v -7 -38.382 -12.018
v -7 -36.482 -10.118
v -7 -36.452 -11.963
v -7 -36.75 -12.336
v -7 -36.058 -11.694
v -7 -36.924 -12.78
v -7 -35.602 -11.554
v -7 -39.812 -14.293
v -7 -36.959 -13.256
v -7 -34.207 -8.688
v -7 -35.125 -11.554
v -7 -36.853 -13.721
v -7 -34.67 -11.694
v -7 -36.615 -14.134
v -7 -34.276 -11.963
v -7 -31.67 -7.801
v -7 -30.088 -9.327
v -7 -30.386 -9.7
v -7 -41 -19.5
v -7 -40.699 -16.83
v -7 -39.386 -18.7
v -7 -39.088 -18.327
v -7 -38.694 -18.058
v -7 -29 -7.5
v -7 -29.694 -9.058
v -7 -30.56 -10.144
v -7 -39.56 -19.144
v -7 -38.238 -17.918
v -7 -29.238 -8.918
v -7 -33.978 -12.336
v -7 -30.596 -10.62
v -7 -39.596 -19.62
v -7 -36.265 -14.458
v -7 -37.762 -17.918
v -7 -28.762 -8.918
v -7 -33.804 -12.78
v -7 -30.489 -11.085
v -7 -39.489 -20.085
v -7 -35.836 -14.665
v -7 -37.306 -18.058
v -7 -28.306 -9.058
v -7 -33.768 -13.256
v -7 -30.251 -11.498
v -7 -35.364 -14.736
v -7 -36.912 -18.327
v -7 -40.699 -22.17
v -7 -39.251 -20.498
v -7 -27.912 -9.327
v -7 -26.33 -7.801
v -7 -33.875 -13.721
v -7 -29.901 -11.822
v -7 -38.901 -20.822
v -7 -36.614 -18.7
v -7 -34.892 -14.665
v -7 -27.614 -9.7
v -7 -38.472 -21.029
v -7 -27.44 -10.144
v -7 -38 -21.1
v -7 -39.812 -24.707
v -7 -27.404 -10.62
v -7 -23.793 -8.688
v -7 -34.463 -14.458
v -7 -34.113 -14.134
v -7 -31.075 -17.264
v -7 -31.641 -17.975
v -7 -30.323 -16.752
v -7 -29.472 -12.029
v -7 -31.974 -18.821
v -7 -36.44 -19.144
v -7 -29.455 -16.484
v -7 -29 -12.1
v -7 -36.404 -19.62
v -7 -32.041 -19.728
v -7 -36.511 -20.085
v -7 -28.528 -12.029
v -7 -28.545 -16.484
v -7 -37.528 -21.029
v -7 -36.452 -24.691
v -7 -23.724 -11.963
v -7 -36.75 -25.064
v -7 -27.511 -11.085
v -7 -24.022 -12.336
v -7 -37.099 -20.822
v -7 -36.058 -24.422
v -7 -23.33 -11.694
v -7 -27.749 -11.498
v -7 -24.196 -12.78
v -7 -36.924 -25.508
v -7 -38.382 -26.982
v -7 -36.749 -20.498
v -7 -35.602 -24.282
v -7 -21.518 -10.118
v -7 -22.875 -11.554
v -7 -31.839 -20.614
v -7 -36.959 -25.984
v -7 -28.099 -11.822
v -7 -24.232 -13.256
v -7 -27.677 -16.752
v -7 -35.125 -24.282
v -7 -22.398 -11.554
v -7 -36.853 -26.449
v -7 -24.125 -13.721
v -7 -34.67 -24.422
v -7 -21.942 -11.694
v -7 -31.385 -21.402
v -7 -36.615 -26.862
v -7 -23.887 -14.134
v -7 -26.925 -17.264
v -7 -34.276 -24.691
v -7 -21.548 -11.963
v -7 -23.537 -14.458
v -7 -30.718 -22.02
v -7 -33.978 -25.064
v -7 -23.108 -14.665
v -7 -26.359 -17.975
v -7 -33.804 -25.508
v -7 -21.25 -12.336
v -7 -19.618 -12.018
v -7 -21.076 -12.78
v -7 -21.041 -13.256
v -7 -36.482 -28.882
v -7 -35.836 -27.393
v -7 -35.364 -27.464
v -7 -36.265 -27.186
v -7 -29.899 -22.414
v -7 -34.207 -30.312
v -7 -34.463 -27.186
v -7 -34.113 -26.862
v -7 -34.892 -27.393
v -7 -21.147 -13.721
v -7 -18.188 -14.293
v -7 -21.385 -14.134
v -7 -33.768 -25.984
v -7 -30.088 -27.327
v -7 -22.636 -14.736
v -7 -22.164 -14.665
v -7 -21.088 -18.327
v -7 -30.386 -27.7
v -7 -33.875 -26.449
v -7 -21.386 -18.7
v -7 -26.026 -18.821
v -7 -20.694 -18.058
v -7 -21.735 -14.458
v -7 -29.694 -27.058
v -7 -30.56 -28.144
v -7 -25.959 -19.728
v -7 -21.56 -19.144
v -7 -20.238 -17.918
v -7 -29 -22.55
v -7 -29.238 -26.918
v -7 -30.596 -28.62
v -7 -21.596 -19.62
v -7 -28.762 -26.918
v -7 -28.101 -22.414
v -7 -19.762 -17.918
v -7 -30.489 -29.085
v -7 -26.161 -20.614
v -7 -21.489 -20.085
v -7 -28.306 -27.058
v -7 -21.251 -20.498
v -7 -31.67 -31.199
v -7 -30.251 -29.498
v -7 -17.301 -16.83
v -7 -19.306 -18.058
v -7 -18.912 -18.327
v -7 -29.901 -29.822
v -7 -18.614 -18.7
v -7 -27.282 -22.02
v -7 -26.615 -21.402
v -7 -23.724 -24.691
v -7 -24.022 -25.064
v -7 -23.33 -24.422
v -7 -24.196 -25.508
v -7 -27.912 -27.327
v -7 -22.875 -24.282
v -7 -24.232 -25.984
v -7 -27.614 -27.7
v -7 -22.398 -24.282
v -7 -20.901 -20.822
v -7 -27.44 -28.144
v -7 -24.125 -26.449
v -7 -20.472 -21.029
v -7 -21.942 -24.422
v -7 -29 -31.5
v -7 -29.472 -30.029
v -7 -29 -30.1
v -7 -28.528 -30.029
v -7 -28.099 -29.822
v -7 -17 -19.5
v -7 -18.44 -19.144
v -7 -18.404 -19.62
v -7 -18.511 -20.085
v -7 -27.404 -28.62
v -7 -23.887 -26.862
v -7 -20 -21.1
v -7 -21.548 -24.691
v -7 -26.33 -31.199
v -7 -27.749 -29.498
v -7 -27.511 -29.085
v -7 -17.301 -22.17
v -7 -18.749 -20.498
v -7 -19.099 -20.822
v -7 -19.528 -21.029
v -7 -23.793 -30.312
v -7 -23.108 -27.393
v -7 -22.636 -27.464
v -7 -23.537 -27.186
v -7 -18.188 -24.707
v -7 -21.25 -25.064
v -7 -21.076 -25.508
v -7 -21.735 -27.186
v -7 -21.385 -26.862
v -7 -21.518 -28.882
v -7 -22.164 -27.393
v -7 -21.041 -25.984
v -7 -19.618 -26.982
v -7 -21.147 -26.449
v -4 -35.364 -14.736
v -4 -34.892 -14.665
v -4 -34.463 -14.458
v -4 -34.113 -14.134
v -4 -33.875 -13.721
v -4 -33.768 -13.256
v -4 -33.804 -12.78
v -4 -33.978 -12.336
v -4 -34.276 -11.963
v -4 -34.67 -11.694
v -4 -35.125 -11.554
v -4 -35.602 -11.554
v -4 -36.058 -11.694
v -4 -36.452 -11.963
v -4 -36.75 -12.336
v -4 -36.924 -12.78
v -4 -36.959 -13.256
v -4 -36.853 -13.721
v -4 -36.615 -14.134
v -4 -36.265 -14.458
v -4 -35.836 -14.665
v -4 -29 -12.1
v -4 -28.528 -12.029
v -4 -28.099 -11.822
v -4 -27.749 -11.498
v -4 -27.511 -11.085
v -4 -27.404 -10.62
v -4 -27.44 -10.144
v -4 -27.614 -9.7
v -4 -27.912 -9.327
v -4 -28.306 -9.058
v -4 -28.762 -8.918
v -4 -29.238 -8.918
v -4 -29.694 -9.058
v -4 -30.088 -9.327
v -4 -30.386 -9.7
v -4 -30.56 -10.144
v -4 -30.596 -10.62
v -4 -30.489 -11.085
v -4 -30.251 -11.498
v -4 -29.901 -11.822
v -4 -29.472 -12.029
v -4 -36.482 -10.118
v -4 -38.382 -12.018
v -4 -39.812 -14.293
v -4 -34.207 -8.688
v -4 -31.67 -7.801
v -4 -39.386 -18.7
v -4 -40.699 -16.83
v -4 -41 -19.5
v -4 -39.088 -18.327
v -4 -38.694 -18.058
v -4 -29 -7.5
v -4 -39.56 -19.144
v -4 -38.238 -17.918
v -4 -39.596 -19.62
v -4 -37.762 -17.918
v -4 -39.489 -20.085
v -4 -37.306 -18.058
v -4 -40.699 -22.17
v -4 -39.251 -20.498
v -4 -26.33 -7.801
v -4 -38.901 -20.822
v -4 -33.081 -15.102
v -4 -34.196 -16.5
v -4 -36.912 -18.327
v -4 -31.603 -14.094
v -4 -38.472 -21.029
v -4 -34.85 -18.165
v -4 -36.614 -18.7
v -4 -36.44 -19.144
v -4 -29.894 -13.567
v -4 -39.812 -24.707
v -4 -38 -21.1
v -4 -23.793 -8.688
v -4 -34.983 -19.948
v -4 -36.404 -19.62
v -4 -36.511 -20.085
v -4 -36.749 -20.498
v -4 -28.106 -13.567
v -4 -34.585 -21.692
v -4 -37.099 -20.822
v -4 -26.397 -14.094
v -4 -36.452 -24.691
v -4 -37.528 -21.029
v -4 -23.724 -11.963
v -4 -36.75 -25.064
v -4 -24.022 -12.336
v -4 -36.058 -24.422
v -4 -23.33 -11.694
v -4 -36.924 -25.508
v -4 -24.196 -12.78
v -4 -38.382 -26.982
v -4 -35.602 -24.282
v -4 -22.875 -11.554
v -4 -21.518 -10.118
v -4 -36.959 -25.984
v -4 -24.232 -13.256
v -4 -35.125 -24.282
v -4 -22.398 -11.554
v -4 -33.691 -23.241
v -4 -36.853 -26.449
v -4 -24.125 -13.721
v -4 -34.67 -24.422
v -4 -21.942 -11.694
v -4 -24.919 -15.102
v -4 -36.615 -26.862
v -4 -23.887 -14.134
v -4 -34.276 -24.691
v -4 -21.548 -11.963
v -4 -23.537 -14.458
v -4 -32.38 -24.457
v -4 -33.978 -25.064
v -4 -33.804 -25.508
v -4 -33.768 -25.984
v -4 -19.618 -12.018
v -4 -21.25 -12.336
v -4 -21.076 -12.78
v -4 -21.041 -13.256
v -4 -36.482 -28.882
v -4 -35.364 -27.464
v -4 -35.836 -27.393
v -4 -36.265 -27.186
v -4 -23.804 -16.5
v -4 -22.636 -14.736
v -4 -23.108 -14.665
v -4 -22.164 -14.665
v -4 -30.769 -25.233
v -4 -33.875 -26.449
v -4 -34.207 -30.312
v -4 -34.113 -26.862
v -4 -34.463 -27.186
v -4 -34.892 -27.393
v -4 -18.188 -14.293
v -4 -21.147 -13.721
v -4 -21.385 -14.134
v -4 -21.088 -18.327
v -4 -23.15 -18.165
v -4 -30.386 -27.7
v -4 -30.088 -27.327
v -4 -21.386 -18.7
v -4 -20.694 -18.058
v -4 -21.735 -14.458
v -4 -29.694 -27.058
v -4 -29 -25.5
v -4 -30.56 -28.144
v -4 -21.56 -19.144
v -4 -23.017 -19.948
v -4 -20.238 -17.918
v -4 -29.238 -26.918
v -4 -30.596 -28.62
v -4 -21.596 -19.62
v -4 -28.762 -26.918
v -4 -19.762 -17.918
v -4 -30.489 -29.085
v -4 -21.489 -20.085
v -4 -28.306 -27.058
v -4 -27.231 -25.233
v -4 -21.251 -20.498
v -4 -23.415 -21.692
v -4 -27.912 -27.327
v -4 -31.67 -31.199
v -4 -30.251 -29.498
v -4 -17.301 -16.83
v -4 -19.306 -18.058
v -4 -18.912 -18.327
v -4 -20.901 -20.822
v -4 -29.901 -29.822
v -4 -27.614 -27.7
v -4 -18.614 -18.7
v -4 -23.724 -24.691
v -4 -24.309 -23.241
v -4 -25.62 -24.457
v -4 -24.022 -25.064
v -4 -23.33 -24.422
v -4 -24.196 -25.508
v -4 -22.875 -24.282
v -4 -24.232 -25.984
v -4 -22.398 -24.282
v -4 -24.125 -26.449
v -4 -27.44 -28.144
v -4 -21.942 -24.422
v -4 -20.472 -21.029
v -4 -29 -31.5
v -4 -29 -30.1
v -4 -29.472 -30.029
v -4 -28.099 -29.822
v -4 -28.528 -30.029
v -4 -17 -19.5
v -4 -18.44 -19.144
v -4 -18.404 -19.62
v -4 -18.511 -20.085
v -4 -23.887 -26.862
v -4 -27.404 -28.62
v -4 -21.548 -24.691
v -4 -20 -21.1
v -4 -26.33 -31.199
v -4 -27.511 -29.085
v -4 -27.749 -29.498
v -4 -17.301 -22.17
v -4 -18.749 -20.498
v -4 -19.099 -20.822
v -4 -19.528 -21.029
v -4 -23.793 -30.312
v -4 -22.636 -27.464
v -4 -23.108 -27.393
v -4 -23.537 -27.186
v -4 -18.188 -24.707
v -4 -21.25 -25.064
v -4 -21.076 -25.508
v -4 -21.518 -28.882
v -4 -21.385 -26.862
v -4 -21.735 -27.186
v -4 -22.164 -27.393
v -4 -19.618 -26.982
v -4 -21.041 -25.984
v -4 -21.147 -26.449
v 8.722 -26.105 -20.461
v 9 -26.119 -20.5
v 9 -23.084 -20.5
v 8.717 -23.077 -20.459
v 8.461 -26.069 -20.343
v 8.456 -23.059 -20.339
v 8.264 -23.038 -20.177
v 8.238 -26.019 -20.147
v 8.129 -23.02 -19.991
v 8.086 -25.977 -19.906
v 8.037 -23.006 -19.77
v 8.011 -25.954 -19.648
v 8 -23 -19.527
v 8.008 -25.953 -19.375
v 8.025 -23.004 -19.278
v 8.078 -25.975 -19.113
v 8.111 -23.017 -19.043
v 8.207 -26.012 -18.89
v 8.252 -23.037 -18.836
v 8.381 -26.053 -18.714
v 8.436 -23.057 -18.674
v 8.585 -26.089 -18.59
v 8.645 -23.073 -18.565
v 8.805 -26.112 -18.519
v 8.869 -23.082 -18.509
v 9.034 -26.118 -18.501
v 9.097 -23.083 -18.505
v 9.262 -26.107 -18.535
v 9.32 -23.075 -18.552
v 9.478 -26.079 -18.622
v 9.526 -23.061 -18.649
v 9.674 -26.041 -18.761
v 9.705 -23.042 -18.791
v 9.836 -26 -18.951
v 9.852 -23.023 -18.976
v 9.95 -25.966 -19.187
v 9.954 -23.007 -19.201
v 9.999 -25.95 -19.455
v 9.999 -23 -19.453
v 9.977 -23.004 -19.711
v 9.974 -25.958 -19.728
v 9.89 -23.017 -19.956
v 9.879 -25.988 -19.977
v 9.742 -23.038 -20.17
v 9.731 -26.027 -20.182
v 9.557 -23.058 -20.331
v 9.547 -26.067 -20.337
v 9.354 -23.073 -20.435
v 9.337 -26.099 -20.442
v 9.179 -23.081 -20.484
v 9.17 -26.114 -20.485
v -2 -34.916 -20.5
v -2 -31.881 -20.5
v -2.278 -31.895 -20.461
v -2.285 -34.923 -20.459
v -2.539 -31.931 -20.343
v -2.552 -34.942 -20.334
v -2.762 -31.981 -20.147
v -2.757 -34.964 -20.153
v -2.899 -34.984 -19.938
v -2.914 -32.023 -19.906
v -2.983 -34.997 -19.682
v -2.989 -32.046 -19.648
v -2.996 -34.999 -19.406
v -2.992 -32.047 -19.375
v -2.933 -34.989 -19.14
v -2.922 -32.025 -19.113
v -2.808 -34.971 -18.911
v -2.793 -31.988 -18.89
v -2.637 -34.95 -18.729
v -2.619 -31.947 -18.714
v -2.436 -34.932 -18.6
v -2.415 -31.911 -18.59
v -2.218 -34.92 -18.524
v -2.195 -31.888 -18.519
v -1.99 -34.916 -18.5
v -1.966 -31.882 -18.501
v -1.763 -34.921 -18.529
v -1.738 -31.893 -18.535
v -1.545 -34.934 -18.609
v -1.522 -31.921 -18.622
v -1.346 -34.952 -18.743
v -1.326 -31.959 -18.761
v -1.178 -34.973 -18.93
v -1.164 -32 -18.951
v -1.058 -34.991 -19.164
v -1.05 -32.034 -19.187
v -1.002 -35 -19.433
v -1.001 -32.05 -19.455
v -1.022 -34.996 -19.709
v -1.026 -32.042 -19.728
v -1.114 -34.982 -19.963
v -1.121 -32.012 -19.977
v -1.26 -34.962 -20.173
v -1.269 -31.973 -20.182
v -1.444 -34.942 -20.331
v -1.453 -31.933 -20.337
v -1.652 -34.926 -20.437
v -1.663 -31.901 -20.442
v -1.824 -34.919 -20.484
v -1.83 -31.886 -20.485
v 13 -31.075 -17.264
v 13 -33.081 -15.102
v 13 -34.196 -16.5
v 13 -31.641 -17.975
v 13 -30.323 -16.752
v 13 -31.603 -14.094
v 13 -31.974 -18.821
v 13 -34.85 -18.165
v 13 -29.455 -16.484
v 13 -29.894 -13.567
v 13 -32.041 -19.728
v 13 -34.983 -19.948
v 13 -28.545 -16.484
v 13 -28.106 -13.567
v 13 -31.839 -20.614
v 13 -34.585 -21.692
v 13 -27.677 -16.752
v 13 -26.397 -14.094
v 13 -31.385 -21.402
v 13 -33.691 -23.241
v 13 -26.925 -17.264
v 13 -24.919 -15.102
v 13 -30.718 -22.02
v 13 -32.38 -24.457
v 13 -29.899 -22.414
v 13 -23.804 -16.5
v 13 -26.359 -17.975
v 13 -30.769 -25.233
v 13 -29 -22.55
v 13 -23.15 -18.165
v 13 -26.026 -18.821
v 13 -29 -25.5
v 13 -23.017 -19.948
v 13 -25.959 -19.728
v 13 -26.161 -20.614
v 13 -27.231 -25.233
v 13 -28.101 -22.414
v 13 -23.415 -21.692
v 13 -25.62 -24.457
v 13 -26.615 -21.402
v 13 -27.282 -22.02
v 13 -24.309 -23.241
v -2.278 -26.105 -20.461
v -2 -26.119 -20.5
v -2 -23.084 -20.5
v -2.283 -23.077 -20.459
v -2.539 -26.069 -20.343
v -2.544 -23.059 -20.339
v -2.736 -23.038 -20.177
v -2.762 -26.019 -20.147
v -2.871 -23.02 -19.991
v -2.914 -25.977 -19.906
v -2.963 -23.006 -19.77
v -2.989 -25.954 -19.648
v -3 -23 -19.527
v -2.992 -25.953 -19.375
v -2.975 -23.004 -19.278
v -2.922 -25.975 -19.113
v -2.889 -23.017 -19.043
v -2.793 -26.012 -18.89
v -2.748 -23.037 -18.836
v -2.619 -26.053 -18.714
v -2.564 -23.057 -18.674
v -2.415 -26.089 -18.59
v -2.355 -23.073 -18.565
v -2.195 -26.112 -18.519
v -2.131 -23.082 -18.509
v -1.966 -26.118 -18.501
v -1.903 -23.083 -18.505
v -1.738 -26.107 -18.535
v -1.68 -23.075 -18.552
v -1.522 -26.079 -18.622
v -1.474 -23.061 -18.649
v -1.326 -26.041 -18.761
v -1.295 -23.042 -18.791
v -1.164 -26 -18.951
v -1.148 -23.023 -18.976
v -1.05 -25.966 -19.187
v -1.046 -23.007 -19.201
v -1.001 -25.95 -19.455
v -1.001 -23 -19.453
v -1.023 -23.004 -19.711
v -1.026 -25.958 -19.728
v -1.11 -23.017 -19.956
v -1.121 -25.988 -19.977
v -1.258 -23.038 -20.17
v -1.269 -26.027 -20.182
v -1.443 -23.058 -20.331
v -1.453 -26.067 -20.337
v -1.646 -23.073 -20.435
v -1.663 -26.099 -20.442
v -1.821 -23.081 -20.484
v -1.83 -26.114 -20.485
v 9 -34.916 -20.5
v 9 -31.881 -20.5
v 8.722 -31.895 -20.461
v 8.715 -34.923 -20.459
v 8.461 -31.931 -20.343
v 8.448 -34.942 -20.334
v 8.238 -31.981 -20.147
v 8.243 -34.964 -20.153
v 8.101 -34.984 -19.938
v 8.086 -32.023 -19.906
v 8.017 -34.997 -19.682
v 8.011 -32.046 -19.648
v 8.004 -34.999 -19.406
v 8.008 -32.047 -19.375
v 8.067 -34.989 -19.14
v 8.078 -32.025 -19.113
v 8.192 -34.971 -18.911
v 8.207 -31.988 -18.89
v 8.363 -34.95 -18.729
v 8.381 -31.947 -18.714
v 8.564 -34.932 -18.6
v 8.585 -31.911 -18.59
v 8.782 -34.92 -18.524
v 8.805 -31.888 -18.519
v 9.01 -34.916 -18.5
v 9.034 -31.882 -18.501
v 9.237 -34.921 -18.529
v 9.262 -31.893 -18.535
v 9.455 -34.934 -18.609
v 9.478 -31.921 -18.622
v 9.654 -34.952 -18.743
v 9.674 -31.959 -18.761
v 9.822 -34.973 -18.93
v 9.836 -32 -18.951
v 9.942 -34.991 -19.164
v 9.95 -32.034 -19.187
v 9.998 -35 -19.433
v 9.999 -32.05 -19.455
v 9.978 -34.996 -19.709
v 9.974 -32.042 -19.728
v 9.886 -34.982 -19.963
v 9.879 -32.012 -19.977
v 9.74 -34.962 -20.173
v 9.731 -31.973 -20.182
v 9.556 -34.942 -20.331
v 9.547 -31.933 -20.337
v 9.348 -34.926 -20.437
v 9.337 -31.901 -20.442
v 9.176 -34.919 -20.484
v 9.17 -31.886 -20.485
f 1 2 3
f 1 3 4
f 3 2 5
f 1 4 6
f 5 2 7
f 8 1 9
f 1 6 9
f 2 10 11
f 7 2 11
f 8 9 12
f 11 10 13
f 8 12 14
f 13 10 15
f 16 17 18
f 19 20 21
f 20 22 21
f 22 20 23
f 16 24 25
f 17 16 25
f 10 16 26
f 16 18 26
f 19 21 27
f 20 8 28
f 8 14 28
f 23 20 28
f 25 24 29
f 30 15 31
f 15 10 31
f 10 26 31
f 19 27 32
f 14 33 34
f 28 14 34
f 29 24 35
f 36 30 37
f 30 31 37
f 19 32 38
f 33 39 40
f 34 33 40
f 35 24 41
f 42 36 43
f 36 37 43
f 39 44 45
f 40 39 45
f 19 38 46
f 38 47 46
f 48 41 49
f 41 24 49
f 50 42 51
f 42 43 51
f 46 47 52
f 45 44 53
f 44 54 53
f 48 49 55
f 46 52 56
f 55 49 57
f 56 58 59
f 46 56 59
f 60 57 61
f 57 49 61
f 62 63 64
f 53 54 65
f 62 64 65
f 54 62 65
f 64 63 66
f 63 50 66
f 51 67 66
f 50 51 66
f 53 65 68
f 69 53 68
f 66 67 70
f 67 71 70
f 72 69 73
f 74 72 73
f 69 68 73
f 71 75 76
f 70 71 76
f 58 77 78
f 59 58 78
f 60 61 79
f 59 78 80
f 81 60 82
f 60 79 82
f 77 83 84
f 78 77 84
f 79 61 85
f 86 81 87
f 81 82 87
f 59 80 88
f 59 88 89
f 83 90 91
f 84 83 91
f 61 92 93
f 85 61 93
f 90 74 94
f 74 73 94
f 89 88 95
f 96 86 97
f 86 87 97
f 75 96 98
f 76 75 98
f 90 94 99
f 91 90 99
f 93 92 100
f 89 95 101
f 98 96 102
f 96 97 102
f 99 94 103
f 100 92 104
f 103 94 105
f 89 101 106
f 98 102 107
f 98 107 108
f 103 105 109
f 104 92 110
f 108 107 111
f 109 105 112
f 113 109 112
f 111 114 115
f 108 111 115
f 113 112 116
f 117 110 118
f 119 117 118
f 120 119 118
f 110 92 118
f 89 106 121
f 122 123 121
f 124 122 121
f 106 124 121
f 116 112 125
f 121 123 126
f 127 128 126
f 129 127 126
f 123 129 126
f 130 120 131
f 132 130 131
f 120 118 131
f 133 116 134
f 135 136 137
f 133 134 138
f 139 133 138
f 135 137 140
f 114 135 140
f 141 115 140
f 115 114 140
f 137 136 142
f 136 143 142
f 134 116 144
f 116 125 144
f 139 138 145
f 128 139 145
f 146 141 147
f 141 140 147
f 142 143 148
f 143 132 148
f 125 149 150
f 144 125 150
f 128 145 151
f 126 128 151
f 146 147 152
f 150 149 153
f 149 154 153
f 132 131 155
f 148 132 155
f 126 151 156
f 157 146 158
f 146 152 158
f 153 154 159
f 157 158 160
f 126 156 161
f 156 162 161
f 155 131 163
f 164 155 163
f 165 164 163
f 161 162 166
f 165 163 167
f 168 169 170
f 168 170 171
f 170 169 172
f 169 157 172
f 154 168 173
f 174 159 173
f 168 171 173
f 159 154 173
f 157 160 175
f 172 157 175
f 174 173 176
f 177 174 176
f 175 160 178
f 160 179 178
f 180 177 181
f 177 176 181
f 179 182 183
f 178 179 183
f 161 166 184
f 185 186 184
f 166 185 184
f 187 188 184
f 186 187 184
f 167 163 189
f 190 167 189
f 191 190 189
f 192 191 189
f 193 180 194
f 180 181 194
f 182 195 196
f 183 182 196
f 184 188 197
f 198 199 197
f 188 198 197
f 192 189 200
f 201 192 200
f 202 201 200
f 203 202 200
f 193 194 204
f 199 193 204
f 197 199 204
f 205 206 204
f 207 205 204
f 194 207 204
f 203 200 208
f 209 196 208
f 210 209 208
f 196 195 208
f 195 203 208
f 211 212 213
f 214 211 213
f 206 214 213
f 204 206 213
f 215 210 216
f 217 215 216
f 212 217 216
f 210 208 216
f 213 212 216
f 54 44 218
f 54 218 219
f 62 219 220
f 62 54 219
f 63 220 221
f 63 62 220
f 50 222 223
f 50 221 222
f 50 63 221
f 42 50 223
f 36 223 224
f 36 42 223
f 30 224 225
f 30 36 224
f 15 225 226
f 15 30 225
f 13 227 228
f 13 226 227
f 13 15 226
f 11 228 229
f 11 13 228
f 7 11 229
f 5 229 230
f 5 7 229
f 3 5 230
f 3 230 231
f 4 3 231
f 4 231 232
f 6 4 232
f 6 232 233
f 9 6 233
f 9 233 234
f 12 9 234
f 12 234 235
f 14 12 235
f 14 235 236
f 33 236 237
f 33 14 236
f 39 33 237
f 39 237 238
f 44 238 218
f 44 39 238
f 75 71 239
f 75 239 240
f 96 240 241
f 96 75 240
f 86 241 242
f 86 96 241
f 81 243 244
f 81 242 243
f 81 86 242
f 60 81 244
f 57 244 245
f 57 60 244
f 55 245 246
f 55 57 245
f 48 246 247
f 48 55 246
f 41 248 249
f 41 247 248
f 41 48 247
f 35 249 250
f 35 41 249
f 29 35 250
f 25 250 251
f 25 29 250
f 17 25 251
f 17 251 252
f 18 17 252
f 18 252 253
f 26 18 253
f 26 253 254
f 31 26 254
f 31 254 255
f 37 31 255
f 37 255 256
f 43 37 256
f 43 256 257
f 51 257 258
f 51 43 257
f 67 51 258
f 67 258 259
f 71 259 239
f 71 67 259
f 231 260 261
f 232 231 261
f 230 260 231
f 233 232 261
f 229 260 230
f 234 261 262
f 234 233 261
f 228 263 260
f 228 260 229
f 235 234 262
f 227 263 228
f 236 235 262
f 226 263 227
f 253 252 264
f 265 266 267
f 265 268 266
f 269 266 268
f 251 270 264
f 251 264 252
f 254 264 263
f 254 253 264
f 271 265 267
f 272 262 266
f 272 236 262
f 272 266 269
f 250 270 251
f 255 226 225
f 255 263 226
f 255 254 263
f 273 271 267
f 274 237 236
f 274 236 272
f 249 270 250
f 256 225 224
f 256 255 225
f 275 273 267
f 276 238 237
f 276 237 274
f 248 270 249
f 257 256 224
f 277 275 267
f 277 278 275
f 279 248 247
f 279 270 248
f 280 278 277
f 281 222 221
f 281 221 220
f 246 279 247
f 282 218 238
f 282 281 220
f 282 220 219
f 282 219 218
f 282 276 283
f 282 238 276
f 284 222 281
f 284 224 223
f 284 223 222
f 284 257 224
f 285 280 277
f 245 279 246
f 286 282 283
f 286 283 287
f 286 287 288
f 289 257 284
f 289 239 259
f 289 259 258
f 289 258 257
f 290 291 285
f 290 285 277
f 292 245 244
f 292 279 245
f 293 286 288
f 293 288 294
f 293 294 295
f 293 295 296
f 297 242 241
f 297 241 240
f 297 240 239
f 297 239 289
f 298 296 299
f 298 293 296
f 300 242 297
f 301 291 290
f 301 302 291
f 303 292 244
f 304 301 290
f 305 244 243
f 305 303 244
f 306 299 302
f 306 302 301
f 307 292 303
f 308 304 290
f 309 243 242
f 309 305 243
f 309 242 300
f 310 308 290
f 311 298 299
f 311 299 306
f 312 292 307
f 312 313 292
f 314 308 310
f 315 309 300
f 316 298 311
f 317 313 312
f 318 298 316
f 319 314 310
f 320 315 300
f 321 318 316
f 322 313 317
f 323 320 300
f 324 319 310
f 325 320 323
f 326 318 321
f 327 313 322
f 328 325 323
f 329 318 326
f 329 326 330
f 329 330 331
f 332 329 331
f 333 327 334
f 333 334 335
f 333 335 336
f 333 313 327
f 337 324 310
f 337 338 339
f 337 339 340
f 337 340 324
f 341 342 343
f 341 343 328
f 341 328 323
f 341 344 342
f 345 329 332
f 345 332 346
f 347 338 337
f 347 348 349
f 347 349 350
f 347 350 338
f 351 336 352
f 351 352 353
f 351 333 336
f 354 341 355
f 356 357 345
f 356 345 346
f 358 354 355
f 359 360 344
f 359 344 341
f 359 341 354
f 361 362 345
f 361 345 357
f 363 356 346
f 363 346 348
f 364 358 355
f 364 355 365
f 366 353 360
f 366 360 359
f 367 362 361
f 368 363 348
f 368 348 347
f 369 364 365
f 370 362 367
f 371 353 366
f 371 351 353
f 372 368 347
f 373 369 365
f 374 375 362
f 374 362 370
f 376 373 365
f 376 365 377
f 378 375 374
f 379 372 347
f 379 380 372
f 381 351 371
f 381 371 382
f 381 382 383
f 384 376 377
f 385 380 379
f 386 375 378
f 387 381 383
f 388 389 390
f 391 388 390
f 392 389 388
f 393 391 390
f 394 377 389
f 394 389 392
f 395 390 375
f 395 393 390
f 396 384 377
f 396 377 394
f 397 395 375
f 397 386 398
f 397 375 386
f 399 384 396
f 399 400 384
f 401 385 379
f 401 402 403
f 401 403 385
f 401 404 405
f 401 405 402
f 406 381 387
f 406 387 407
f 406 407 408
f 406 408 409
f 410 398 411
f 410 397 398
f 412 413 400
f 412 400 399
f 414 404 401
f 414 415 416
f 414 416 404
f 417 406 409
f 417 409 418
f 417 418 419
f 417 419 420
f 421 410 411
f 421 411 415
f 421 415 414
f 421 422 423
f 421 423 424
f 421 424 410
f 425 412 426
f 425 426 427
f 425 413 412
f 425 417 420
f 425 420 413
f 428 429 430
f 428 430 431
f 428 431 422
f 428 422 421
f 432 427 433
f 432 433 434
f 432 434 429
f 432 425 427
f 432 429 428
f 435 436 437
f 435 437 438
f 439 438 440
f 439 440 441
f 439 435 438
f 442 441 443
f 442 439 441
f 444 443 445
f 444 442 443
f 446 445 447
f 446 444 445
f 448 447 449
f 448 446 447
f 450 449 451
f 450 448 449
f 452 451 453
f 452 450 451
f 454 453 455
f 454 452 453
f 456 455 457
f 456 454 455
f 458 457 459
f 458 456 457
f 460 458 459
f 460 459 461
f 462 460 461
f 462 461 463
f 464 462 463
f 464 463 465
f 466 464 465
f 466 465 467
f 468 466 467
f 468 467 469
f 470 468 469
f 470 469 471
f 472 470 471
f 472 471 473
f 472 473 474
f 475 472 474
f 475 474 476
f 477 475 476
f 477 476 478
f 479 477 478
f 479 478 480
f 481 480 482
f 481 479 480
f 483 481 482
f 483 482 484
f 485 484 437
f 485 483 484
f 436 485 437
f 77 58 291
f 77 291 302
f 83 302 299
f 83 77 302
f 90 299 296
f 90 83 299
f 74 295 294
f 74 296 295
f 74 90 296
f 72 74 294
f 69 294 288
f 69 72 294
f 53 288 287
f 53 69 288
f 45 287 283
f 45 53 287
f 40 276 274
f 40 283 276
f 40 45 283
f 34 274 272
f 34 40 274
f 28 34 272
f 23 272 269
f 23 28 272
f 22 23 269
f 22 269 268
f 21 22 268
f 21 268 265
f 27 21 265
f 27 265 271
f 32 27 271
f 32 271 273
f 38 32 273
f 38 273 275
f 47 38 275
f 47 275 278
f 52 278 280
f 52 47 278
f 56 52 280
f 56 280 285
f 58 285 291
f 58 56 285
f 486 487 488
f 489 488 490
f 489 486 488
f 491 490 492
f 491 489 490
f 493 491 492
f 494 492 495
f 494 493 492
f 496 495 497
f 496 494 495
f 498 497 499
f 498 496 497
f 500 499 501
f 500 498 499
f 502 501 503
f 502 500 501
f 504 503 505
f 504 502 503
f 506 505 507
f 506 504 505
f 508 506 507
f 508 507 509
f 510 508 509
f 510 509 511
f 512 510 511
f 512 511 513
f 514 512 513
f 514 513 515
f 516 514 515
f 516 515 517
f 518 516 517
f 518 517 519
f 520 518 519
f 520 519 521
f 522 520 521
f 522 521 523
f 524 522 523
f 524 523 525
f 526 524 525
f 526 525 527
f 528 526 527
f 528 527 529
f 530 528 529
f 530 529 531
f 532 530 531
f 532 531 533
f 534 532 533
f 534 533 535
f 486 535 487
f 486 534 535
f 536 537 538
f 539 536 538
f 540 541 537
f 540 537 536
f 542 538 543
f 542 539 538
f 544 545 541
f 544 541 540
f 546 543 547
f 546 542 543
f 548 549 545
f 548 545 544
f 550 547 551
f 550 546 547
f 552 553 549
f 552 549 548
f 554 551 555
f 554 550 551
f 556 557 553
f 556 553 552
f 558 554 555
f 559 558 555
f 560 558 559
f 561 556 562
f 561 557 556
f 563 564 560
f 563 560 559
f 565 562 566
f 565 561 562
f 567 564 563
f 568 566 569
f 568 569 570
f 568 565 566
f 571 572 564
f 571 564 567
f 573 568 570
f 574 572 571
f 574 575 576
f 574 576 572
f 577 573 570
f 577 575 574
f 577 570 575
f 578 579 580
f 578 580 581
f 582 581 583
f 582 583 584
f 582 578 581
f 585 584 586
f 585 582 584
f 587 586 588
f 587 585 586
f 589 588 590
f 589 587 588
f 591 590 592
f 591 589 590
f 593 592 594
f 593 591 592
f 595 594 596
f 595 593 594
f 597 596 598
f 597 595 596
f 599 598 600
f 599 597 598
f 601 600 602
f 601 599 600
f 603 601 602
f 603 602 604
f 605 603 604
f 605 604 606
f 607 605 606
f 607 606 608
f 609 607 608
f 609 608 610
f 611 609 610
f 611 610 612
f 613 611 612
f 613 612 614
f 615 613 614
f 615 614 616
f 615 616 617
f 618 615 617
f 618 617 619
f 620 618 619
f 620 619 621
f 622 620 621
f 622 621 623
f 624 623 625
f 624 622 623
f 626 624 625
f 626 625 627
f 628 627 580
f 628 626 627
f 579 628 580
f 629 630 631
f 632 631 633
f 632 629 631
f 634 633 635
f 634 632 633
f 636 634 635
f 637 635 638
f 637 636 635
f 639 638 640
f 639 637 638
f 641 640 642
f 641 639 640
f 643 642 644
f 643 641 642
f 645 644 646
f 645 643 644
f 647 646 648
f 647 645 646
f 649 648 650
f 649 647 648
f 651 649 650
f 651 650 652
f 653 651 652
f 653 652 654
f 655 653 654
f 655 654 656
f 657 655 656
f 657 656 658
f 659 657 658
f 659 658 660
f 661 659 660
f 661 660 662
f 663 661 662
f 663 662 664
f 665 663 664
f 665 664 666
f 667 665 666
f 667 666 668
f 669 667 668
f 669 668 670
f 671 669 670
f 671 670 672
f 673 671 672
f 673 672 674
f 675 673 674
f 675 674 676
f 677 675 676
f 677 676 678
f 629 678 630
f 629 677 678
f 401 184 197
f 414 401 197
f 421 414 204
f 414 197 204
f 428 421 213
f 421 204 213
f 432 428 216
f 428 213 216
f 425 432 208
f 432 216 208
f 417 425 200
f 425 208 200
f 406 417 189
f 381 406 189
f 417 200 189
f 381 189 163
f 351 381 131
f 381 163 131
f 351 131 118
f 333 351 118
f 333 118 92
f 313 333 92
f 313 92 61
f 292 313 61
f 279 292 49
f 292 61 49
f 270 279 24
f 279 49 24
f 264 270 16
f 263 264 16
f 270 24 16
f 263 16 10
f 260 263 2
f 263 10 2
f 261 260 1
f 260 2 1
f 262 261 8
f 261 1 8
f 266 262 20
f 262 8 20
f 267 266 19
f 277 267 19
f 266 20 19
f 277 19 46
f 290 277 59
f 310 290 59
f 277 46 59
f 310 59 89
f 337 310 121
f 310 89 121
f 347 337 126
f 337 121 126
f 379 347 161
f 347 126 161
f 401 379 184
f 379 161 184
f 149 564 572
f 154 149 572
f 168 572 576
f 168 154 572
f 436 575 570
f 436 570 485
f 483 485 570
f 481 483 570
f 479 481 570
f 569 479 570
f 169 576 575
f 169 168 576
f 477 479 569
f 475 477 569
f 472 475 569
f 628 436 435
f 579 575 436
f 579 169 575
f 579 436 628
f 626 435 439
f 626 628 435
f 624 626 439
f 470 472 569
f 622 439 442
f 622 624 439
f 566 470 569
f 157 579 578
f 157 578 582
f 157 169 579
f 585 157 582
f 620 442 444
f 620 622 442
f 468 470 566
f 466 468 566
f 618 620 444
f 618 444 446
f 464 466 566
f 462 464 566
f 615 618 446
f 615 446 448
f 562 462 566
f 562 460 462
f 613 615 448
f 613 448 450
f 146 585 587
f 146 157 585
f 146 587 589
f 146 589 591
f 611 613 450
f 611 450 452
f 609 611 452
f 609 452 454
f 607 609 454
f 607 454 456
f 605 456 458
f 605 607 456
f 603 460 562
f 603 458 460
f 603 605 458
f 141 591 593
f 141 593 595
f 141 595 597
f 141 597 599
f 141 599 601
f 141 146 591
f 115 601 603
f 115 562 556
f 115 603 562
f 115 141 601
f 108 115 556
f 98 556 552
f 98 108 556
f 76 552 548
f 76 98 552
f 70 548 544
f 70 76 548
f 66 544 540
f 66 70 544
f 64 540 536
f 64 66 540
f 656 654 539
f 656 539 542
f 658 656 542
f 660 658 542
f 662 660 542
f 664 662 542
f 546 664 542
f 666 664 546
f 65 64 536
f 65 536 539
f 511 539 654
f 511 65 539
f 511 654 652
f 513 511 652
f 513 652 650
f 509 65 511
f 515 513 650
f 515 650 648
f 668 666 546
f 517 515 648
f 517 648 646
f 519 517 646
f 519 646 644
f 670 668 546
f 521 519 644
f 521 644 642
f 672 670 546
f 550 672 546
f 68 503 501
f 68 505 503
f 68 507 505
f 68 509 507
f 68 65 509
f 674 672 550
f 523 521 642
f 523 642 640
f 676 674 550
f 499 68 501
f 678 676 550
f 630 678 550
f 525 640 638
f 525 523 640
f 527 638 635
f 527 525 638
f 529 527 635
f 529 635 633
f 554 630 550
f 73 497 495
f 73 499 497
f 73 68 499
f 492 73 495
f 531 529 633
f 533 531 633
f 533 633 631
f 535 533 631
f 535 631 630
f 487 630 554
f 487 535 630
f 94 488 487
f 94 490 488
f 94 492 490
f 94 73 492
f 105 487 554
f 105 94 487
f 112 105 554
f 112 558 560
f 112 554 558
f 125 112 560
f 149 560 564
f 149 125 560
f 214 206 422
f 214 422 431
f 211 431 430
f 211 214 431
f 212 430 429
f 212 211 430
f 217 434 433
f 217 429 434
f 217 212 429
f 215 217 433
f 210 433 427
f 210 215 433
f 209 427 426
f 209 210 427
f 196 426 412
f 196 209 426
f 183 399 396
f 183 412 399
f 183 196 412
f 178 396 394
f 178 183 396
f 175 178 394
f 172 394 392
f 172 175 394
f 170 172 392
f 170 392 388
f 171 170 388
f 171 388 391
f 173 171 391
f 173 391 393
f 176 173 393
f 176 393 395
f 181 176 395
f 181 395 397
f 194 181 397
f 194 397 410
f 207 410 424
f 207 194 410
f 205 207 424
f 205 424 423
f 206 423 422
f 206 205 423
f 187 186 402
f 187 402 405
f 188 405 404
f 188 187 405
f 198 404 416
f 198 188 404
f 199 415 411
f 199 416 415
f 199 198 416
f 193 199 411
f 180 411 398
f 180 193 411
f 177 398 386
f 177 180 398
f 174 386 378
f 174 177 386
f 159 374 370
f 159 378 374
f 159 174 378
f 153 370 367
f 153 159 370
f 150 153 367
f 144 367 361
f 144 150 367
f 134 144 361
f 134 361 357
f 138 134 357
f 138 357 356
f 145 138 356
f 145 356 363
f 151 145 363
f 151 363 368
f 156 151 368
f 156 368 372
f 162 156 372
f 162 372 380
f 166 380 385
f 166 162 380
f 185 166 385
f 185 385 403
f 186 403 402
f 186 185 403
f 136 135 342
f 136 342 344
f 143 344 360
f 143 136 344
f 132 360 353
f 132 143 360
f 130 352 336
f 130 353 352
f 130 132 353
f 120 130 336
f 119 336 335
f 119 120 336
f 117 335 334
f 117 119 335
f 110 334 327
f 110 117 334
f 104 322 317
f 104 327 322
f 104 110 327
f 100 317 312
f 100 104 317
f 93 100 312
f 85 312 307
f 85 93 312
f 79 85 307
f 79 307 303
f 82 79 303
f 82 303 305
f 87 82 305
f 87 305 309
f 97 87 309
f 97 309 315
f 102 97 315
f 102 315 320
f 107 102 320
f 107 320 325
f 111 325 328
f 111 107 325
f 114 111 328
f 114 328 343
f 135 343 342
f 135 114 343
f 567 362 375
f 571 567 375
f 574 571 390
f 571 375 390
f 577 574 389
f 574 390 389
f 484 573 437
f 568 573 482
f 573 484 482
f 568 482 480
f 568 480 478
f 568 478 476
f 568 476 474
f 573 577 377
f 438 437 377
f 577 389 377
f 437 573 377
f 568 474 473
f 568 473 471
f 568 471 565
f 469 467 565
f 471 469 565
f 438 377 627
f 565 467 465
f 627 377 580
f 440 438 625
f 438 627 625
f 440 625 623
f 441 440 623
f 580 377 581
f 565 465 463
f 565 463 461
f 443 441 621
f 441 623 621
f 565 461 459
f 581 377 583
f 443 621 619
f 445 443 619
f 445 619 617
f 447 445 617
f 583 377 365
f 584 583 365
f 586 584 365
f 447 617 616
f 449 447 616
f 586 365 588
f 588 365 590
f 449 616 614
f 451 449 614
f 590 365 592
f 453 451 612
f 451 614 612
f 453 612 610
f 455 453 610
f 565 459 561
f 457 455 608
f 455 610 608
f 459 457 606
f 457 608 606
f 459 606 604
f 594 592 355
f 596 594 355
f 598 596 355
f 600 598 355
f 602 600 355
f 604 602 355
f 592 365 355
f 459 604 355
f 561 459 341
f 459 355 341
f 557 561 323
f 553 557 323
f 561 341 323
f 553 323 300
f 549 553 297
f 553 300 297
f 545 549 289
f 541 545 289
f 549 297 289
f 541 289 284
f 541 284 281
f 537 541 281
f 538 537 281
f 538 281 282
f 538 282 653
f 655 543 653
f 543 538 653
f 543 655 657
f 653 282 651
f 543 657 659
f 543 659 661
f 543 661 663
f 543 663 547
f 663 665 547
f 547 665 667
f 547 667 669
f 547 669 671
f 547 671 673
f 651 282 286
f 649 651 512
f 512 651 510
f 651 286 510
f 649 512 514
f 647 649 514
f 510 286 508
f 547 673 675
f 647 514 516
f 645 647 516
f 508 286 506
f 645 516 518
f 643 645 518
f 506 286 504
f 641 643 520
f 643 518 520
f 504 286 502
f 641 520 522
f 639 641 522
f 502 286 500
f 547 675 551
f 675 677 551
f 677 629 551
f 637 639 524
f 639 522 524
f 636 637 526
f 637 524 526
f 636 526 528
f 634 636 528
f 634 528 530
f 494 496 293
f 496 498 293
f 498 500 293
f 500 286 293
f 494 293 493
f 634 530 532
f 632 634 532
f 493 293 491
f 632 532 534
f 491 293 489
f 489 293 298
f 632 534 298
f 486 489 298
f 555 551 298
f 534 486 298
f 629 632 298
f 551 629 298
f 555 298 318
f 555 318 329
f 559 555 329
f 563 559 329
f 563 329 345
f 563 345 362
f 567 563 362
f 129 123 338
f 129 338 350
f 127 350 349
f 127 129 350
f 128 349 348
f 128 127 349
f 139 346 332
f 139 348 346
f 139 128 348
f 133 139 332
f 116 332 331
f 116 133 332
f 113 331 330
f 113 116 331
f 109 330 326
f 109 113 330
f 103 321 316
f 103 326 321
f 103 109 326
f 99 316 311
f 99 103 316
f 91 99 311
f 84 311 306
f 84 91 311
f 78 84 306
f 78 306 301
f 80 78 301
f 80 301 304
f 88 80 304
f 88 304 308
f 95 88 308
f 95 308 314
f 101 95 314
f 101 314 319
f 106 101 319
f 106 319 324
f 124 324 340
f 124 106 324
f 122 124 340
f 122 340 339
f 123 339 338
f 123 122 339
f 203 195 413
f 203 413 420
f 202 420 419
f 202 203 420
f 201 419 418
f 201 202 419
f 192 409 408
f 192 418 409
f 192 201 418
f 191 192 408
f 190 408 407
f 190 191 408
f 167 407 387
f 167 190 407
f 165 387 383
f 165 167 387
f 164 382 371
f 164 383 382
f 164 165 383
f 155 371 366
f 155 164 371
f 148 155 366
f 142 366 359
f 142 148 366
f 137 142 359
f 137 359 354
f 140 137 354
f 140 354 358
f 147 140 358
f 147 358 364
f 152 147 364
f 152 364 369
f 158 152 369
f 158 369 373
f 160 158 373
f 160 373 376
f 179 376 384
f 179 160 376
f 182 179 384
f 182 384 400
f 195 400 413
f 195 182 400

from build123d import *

# Parameters (mm, degrees)
COUPLING_BARREL_SKETCH_R         = 6
COUPLING_BARREL_DEPTH            = 20
SERVICE_LOCK_DISC_SKETCH_R       = 12
SERVICE_LOCK_DISC_DEPTH          = 3
SHAFT_RUNNING_BORE_SKETCH_R      = 3.05
SHAFT_RUNNING_BORE_DEPTH         = 20.2
TORQUE_CROSS_PIN_HOLE_1_SKETCH_R = 1
TORQUE_CROSS_PIN_HOLE_1_DEPTH    = 26
TORQUE_CROSS_PIN_HOLE_2_SKETCH_R = 1
TORQUE_CROSS_PIN_HOLE_2_DEPTH    = 26
SERVICE_LOCK_POSITION_1_SKETCH_R = 1.6
SERVICE_LOCK_POSITION_1_DEPTH    = 3.2
SERVICE_LOCK_POSITION_2_SKETCH_R = 1.6
SERVICE_LOCK_POSITION_2_DEPTH    = 3.2
SERVICE_LOCK_POSITION_3_SKETCH_R = 1.6
SERVICE_LOCK_POSITION_3_DEPTH    = 3.2
SERVICE_LOCK_POSITION_4_SKETCH_R = 1.6
SERVICE_LOCK_POSITION_4_DEPTH    = 3.2
SERVICE_LOCK_POSITION_5_SKETCH_R = 1.6
SERVICE_LOCK_POSITION_5_DEPTH    = 3.2
SERVICE_LOCK_POSITION_6_SKETCH_R = 1.6
SERVICE_LOCK_POSITION_6_DEPTH    = 3.2
SERVICE_LOCK_POSITION_7_SKETCH_R = 1.6
SERVICE_LOCK_POSITION_7_DEPTH    = 3.2
SERVICE_LOCK_POSITION_8_SKETCH_R = 1.6
SERVICE_LOCK_POSITION_8_DEPTH    = 3.2


with BuildPart() as part:
    # Coupling barrel sketch → Coupling barrel (new body)
    with BuildSketch(Plane(origin=(-7, 0, 0), x_dir=(0, 0, -1), z_dir=(1, 0, 0))):
        with Locations((19.5, -29)):
            Circle(COUPLING_BARREL_SKETCH_R)
    extrude(amount=COUPLING_BARREL_DEPTH)

    # Service lock disc sketch → Service lock disc (add)
    with BuildSketch(Plane(origin=(-7, 0, 0), x_dir=(0, 0, -1), z_dir=(1, 0, 0))):
        with Locations((19.5, -29)):
            Circle(SERVICE_LOCK_DISC_SKETCH_R)
    extrude(amount=SERVICE_LOCK_DISC_DEPTH)

    # Shaft running bore sketch → Shaft running bore (cut)
    with BuildSketch(Plane(origin=(-7.1, 0, 0), x_dir=(0, 0, -1), z_dir=(1, 0, 0))):
        with Locations((19.5, -29)):
            Circle(SHAFT_RUNNING_BORE_SKETCH_R)
    extrude(amount=SHAFT_RUNNING_BORE_DEPTH, mode=Mode.SUBTRACT)

    # Torque cross pin hole 1 sketch → Torque cross pin hole 1 (cut)
    with BuildSketch(Plane(origin=(0, -42, 0), x_dir=(1, 0, 0), z_dir=(0, 1, 0))):
        with Locations(Location((-2, 19.5, 0), (0, 0, 90))):
            Circle(TORQUE_CROSS_PIN_HOLE_1_SKETCH_R)
    extrude(amount=TORQUE_CROSS_PIN_HOLE_1_DEPTH, mode=Mode.SUBTRACT)

    # Torque cross pin hole 2 sketch → Torque cross pin hole 2 (cut)
    with BuildSketch(Plane(origin=(0, -42, 0), x_dir=(1, 0, 0), z_dir=(0, 1, 0))):
        with Locations(Location((9, 19.5, 0), (0, 0, 90))):
            Circle(TORQUE_CROSS_PIN_HOLE_2_SKETCH_R)
    extrude(amount=TORQUE_CROSS_PIN_HOLE_2_DEPTH, mode=Mode.SUBTRACT)

    # Service lock position 1 sketch → Service lock position 1 (cut)
    with BuildSketch(Plane(origin=(-7.1, 0, 0), x_dir=(0, 0, -1), z_dir=(1, 0, 0))):
        with Locations((19.5, -20)):
            Circle(SERVICE_LOCK_POSITION_1_SKETCH_R)
    extrude(amount=SERVICE_LOCK_POSITION_1_DEPTH, mode=Mode.SUBTRACT)

    # Service lock position 2 sketch → Service lock position 2 (cut)
    with BuildSketch(Plane(origin=(-7.1, 0, 0), x_dir=(0, 0, -1), z_dir=(1, 0, 0))):
        with Locations((13.136038969, -22.636038969)):
            Circle(SERVICE_LOCK_POSITION_2_SKETCH_R)
    extrude(amount=SERVICE_LOCK_POSITION_2_DEPTH, mode=Mode.SUBTRACT)

    # Service lock position 3 sketch → Service lock position 3 (cut)
    with BuildSketch(Plane(origin=(-7.1, 0, 0), x_dir=(0, 0, -1), z_dir=(1, 0, 0))):
        with Locations((10.5, -29)):
            Circle(SERVICE_LOCK_POSITION_3_SKETCH_R)
    extrude(amount=SERVICE_LOCK_POSITION_3_DEPTH, mode=Mode.SUBTRACT)

    # Service lock position 4 sketch → Service lock position 4 (cut)
    with BuildSketch(Plane(origin=(-7.1, 0, 0), x_dir=(0, 0, -1), z_dir=(1, 0, 0))):
        with Locations((13.136038969, -35.363961031)):
            Circle(SERVICE_LOCK_POSITION_4_SKETCH_R)
    extrude(amount=SERVICE_LOCK_POSITION_4_DEPTH, mode=Mode.SUBTRACT)

    # Service lock position 5 sketch → Service lock position 5 (cut)
    with BuildSketch(Plane(origin=(-7.1, 0, 0), x_dir=(0, 0, -1), z_dir=(1, 0, 0))):
        with Locations((19.5, -38)):
            Circle(SERVICE_LOCK_POSITION_5_SKETCH_R)
    extrude(amount=SERVICE_LOCK_POSITION_5_DEPTH, mode=Mode.SUBTRACT)

    # Service lock position 6 sketch → Service lock position 6 (cut)
    with BuildSketch(Plane(origin=(-7.1, 0, 0), x_dir=(0, 0, -1), z_dir=(1, 0, 0))):
        with Locations((25.863961031, -35.363961031)):
            Circle(SERVICE_LOCK_POSITION_6_SKETCH_R)
    extrude(amount=SERVICE_LOCK_POSITION_6_DEPTH, mode=Mode.SUBTRACT)

    # Service lock position 7 sketch → Service lock position 7 (cut)
    with BuildSketch(Plane(origin=(-7.1, 0, 0), x_dir=(0, 0, -1), z_dir=(1, 0, 0))):
        with Locations((28.5, -29)):
            Circle(SERVICE_LOCK_POSITION_7_SKETCH_R)
    extrude(amount=SERVICE_LOCK_POSITION_7_DEPTH, mode=Mode.SUBTRACT)

    # Service lock position 8 sketch → Service lock position 8 (cut)
    with BuildSketch(Plane(origin=(-7.1, 0, 0), x_dir=(0, 0, -1), z_dir=(1, 0, 0))):
        with Locations((25.863961031, -22.636038969)):
            Circle(SERVICE_LOCK_POSITION_8_SKETCH_R)
    extrude(amount=SERVICE_LOCK_POSITION_8_DEPTH, mode=Mode.SUBTRACT)


solid = part.part
